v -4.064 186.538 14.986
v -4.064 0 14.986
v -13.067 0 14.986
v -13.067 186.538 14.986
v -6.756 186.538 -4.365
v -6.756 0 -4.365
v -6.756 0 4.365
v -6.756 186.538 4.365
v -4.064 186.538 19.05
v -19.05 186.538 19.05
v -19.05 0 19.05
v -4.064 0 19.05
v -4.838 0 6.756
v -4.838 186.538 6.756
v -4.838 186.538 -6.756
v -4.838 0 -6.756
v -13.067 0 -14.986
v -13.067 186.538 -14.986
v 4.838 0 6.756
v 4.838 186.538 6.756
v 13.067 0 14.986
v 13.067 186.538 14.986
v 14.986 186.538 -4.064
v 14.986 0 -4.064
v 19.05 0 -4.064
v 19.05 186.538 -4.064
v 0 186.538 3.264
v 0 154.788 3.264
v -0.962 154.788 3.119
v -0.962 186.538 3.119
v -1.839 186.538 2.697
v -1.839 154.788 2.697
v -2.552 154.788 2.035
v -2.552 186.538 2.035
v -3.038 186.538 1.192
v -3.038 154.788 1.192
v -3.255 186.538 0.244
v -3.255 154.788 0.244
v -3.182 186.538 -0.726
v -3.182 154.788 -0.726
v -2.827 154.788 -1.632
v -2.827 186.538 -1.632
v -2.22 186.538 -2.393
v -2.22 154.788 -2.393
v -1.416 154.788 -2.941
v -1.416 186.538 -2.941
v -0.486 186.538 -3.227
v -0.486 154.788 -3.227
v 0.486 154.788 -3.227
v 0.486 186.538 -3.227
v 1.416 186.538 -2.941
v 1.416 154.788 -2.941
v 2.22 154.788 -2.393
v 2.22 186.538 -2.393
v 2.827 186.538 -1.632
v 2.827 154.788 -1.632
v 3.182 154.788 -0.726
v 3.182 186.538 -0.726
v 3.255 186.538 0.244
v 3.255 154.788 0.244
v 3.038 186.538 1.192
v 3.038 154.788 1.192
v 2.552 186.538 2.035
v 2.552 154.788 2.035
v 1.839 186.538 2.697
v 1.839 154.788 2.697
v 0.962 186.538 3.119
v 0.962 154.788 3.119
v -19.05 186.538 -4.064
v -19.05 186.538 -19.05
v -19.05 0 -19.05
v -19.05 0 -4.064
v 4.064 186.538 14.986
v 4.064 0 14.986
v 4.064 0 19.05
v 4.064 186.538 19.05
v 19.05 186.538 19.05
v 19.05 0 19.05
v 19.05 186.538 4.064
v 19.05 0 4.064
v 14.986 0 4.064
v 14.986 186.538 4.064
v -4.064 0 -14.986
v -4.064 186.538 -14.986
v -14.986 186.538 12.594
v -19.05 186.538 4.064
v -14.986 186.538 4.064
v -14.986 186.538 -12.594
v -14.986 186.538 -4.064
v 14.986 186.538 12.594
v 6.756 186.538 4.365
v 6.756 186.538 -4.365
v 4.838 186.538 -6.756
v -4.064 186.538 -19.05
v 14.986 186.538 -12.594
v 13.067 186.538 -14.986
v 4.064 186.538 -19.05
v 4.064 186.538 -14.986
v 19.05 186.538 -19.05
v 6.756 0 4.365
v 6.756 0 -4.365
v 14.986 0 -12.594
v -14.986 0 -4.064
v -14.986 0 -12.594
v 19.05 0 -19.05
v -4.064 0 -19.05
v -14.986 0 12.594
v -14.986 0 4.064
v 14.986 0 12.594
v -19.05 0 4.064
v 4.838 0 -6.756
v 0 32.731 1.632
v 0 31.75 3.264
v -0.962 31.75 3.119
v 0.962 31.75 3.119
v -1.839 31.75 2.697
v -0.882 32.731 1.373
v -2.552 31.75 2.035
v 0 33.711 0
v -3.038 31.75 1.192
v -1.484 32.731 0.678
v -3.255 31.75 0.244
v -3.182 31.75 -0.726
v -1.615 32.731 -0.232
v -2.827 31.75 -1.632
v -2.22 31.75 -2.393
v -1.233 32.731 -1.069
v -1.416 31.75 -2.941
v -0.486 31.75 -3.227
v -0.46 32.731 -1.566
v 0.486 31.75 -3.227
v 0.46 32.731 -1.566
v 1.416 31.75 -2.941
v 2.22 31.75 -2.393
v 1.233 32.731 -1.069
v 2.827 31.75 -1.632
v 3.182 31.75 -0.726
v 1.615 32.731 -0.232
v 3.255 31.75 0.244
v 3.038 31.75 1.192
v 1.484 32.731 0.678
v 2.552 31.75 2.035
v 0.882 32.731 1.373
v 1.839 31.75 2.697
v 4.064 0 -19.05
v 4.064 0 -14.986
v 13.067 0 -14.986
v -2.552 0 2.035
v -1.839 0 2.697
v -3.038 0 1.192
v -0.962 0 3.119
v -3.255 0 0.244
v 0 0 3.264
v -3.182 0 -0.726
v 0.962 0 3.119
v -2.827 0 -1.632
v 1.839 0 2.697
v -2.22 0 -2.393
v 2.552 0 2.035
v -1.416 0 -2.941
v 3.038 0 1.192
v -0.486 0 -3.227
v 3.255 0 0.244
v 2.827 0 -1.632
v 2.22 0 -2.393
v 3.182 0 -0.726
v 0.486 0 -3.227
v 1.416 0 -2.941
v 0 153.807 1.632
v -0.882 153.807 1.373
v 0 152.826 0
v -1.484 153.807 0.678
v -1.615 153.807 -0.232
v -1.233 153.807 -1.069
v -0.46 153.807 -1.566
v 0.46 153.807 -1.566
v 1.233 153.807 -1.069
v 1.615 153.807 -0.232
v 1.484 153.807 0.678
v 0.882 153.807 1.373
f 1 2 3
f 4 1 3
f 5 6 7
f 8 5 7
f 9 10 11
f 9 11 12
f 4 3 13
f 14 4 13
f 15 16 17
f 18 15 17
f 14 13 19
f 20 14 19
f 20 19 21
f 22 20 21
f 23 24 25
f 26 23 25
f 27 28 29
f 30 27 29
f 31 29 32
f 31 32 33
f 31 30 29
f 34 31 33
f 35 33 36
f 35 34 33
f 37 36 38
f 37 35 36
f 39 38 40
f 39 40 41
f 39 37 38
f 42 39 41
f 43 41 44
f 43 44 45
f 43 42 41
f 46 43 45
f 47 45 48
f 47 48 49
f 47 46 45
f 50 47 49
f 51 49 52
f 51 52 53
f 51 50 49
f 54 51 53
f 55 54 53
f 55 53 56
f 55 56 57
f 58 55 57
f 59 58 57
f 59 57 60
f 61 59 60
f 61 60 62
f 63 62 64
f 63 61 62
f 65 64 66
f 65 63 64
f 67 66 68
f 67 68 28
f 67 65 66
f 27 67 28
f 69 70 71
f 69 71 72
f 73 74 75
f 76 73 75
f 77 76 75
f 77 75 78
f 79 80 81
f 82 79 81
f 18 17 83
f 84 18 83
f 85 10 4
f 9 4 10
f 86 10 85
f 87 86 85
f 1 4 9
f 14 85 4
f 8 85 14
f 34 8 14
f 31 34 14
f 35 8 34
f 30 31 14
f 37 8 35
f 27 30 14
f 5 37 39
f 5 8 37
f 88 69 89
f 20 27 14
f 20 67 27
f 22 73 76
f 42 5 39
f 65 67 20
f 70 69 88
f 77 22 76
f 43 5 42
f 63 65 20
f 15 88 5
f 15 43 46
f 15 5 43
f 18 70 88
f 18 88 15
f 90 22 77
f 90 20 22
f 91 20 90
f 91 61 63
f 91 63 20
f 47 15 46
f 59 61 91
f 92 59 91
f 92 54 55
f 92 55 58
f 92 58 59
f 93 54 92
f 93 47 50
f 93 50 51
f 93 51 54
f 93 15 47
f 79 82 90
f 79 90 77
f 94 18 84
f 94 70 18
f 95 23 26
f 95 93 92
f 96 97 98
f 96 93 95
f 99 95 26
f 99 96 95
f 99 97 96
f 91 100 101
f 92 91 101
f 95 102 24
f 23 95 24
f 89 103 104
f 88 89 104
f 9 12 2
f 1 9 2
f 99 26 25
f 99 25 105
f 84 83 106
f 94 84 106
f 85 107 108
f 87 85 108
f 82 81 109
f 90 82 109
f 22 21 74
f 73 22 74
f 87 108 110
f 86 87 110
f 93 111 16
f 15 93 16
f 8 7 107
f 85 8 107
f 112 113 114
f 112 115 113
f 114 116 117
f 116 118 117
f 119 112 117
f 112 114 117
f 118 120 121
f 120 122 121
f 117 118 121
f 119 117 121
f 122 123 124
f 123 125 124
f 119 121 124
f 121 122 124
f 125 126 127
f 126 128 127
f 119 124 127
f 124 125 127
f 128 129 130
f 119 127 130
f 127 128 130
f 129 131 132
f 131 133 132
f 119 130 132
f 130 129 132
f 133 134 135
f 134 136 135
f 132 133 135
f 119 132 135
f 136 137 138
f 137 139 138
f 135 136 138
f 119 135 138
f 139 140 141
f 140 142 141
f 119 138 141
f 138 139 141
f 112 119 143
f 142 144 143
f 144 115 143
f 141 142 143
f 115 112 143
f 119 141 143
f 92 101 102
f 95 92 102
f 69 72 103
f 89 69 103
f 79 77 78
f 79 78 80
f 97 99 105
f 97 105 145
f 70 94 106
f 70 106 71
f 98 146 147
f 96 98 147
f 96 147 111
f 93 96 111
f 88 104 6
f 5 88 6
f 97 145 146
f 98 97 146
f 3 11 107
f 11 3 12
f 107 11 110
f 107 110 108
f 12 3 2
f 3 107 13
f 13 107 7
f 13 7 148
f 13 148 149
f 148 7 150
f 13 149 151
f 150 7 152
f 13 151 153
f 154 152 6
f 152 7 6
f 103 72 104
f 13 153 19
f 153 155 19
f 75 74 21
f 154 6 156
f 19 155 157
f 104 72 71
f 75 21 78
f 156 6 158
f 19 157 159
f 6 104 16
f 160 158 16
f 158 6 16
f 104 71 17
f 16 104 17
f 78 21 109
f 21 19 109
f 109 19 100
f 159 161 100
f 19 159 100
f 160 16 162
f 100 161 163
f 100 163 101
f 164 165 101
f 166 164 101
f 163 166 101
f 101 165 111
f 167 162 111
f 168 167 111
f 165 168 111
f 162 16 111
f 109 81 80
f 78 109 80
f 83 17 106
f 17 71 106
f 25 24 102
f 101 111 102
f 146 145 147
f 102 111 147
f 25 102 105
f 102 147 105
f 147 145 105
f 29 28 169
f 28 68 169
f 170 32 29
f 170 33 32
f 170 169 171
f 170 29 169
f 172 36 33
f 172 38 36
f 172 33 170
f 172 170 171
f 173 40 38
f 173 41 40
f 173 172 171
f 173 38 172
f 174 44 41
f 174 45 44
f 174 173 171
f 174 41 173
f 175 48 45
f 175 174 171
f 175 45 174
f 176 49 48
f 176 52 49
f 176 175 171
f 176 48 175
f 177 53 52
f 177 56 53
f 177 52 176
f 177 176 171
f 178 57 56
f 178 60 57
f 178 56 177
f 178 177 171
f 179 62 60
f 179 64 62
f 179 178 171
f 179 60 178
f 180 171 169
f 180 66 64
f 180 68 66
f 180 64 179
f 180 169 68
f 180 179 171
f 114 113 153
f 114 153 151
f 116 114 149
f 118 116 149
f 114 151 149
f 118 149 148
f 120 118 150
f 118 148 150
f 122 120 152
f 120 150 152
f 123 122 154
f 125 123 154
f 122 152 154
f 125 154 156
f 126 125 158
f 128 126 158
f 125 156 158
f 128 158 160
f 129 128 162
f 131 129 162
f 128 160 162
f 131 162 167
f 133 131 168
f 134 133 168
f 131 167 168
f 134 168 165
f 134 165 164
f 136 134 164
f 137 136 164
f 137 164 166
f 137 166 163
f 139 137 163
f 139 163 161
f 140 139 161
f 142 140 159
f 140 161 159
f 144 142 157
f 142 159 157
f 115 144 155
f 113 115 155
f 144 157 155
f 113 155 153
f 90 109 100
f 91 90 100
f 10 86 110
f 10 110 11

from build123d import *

# Parameters (mm, degrees)
EXTRUDE1_DEPTH = 186.5376


# Read off the part's stored shape, not the designer's step: 1515<1>
with BuildPart() as part:
    # Sketch1<2> → Extrude1 (new body)
    with BuildSketch(Plane(origin=(0, 0, 0), x_dir=(1, 0, 0), z_dir=(0, 1, 0))):
        Polygon((-6.7564, 4.364749804), (-6.7564, -4.364749804), (-14.986, -12.594349804), (-14.986, -4.064), (-19.05, -4.064), (-19.05, -19.05), (-4.064, -19.05), (-4.064, -14.986), (-13.067127258, -14.986), (-4.837527258, -6.7564), (4.837527258, -6.7564), (13.067127258, -14.986), (4.064, -14.986), (4.064, -19.05), (19.05, -19.05), (19.05, -4.064), (14.986, -4.064), (14.986, -12.594349804), (6.7564, -4.364749804), (6.7564, 4.364749804), (14.986, 12.594349804), (14.986, 4.064), (19.05, 4.064), (19.05, 19.05), (4.064, 19.05), (4.064, 14.986), (13.067127258, 14.986), (4.837527258, 6.7564), (-4.837527258, 6.7564), (-13.067127258, 14.986), (-4.064, 14.986), (-4.064, 19.05), (-19.05, 19.05), (-19.05, 4.064), (-14.986, 4.064), (-14.986, 12.594349804), align=None)
    extrude(amount=EXTRUDE1_DEPTH)

    # Sketch2 → 5/16-18 Tapped Hole1 (revolve, cut)
    with BuildSketch(Plane(origin=(0, 186.5376, 0), x_dir=(0, 0, 1), z_dir=(1, 0, 0))):
        Polygon((0, 0), (0, 33.711148974), (3.2639, 31.75), (3.2639, 0), align=None)
    f_5_16_18_tapped_hole1 = revolve(axis=Axis((0, 192.8876, 0), (0, -1, 0)), mode=Mode.SUBTRACT)

    # Mirror1: 5/16-18 Tapped Hole1 across plane
    add(f_5_16_18_tapped_hole1.mirror(Plane.ZX.offset(93.2688)), mode=Mode.SUBTRACT)


solid = part.part
